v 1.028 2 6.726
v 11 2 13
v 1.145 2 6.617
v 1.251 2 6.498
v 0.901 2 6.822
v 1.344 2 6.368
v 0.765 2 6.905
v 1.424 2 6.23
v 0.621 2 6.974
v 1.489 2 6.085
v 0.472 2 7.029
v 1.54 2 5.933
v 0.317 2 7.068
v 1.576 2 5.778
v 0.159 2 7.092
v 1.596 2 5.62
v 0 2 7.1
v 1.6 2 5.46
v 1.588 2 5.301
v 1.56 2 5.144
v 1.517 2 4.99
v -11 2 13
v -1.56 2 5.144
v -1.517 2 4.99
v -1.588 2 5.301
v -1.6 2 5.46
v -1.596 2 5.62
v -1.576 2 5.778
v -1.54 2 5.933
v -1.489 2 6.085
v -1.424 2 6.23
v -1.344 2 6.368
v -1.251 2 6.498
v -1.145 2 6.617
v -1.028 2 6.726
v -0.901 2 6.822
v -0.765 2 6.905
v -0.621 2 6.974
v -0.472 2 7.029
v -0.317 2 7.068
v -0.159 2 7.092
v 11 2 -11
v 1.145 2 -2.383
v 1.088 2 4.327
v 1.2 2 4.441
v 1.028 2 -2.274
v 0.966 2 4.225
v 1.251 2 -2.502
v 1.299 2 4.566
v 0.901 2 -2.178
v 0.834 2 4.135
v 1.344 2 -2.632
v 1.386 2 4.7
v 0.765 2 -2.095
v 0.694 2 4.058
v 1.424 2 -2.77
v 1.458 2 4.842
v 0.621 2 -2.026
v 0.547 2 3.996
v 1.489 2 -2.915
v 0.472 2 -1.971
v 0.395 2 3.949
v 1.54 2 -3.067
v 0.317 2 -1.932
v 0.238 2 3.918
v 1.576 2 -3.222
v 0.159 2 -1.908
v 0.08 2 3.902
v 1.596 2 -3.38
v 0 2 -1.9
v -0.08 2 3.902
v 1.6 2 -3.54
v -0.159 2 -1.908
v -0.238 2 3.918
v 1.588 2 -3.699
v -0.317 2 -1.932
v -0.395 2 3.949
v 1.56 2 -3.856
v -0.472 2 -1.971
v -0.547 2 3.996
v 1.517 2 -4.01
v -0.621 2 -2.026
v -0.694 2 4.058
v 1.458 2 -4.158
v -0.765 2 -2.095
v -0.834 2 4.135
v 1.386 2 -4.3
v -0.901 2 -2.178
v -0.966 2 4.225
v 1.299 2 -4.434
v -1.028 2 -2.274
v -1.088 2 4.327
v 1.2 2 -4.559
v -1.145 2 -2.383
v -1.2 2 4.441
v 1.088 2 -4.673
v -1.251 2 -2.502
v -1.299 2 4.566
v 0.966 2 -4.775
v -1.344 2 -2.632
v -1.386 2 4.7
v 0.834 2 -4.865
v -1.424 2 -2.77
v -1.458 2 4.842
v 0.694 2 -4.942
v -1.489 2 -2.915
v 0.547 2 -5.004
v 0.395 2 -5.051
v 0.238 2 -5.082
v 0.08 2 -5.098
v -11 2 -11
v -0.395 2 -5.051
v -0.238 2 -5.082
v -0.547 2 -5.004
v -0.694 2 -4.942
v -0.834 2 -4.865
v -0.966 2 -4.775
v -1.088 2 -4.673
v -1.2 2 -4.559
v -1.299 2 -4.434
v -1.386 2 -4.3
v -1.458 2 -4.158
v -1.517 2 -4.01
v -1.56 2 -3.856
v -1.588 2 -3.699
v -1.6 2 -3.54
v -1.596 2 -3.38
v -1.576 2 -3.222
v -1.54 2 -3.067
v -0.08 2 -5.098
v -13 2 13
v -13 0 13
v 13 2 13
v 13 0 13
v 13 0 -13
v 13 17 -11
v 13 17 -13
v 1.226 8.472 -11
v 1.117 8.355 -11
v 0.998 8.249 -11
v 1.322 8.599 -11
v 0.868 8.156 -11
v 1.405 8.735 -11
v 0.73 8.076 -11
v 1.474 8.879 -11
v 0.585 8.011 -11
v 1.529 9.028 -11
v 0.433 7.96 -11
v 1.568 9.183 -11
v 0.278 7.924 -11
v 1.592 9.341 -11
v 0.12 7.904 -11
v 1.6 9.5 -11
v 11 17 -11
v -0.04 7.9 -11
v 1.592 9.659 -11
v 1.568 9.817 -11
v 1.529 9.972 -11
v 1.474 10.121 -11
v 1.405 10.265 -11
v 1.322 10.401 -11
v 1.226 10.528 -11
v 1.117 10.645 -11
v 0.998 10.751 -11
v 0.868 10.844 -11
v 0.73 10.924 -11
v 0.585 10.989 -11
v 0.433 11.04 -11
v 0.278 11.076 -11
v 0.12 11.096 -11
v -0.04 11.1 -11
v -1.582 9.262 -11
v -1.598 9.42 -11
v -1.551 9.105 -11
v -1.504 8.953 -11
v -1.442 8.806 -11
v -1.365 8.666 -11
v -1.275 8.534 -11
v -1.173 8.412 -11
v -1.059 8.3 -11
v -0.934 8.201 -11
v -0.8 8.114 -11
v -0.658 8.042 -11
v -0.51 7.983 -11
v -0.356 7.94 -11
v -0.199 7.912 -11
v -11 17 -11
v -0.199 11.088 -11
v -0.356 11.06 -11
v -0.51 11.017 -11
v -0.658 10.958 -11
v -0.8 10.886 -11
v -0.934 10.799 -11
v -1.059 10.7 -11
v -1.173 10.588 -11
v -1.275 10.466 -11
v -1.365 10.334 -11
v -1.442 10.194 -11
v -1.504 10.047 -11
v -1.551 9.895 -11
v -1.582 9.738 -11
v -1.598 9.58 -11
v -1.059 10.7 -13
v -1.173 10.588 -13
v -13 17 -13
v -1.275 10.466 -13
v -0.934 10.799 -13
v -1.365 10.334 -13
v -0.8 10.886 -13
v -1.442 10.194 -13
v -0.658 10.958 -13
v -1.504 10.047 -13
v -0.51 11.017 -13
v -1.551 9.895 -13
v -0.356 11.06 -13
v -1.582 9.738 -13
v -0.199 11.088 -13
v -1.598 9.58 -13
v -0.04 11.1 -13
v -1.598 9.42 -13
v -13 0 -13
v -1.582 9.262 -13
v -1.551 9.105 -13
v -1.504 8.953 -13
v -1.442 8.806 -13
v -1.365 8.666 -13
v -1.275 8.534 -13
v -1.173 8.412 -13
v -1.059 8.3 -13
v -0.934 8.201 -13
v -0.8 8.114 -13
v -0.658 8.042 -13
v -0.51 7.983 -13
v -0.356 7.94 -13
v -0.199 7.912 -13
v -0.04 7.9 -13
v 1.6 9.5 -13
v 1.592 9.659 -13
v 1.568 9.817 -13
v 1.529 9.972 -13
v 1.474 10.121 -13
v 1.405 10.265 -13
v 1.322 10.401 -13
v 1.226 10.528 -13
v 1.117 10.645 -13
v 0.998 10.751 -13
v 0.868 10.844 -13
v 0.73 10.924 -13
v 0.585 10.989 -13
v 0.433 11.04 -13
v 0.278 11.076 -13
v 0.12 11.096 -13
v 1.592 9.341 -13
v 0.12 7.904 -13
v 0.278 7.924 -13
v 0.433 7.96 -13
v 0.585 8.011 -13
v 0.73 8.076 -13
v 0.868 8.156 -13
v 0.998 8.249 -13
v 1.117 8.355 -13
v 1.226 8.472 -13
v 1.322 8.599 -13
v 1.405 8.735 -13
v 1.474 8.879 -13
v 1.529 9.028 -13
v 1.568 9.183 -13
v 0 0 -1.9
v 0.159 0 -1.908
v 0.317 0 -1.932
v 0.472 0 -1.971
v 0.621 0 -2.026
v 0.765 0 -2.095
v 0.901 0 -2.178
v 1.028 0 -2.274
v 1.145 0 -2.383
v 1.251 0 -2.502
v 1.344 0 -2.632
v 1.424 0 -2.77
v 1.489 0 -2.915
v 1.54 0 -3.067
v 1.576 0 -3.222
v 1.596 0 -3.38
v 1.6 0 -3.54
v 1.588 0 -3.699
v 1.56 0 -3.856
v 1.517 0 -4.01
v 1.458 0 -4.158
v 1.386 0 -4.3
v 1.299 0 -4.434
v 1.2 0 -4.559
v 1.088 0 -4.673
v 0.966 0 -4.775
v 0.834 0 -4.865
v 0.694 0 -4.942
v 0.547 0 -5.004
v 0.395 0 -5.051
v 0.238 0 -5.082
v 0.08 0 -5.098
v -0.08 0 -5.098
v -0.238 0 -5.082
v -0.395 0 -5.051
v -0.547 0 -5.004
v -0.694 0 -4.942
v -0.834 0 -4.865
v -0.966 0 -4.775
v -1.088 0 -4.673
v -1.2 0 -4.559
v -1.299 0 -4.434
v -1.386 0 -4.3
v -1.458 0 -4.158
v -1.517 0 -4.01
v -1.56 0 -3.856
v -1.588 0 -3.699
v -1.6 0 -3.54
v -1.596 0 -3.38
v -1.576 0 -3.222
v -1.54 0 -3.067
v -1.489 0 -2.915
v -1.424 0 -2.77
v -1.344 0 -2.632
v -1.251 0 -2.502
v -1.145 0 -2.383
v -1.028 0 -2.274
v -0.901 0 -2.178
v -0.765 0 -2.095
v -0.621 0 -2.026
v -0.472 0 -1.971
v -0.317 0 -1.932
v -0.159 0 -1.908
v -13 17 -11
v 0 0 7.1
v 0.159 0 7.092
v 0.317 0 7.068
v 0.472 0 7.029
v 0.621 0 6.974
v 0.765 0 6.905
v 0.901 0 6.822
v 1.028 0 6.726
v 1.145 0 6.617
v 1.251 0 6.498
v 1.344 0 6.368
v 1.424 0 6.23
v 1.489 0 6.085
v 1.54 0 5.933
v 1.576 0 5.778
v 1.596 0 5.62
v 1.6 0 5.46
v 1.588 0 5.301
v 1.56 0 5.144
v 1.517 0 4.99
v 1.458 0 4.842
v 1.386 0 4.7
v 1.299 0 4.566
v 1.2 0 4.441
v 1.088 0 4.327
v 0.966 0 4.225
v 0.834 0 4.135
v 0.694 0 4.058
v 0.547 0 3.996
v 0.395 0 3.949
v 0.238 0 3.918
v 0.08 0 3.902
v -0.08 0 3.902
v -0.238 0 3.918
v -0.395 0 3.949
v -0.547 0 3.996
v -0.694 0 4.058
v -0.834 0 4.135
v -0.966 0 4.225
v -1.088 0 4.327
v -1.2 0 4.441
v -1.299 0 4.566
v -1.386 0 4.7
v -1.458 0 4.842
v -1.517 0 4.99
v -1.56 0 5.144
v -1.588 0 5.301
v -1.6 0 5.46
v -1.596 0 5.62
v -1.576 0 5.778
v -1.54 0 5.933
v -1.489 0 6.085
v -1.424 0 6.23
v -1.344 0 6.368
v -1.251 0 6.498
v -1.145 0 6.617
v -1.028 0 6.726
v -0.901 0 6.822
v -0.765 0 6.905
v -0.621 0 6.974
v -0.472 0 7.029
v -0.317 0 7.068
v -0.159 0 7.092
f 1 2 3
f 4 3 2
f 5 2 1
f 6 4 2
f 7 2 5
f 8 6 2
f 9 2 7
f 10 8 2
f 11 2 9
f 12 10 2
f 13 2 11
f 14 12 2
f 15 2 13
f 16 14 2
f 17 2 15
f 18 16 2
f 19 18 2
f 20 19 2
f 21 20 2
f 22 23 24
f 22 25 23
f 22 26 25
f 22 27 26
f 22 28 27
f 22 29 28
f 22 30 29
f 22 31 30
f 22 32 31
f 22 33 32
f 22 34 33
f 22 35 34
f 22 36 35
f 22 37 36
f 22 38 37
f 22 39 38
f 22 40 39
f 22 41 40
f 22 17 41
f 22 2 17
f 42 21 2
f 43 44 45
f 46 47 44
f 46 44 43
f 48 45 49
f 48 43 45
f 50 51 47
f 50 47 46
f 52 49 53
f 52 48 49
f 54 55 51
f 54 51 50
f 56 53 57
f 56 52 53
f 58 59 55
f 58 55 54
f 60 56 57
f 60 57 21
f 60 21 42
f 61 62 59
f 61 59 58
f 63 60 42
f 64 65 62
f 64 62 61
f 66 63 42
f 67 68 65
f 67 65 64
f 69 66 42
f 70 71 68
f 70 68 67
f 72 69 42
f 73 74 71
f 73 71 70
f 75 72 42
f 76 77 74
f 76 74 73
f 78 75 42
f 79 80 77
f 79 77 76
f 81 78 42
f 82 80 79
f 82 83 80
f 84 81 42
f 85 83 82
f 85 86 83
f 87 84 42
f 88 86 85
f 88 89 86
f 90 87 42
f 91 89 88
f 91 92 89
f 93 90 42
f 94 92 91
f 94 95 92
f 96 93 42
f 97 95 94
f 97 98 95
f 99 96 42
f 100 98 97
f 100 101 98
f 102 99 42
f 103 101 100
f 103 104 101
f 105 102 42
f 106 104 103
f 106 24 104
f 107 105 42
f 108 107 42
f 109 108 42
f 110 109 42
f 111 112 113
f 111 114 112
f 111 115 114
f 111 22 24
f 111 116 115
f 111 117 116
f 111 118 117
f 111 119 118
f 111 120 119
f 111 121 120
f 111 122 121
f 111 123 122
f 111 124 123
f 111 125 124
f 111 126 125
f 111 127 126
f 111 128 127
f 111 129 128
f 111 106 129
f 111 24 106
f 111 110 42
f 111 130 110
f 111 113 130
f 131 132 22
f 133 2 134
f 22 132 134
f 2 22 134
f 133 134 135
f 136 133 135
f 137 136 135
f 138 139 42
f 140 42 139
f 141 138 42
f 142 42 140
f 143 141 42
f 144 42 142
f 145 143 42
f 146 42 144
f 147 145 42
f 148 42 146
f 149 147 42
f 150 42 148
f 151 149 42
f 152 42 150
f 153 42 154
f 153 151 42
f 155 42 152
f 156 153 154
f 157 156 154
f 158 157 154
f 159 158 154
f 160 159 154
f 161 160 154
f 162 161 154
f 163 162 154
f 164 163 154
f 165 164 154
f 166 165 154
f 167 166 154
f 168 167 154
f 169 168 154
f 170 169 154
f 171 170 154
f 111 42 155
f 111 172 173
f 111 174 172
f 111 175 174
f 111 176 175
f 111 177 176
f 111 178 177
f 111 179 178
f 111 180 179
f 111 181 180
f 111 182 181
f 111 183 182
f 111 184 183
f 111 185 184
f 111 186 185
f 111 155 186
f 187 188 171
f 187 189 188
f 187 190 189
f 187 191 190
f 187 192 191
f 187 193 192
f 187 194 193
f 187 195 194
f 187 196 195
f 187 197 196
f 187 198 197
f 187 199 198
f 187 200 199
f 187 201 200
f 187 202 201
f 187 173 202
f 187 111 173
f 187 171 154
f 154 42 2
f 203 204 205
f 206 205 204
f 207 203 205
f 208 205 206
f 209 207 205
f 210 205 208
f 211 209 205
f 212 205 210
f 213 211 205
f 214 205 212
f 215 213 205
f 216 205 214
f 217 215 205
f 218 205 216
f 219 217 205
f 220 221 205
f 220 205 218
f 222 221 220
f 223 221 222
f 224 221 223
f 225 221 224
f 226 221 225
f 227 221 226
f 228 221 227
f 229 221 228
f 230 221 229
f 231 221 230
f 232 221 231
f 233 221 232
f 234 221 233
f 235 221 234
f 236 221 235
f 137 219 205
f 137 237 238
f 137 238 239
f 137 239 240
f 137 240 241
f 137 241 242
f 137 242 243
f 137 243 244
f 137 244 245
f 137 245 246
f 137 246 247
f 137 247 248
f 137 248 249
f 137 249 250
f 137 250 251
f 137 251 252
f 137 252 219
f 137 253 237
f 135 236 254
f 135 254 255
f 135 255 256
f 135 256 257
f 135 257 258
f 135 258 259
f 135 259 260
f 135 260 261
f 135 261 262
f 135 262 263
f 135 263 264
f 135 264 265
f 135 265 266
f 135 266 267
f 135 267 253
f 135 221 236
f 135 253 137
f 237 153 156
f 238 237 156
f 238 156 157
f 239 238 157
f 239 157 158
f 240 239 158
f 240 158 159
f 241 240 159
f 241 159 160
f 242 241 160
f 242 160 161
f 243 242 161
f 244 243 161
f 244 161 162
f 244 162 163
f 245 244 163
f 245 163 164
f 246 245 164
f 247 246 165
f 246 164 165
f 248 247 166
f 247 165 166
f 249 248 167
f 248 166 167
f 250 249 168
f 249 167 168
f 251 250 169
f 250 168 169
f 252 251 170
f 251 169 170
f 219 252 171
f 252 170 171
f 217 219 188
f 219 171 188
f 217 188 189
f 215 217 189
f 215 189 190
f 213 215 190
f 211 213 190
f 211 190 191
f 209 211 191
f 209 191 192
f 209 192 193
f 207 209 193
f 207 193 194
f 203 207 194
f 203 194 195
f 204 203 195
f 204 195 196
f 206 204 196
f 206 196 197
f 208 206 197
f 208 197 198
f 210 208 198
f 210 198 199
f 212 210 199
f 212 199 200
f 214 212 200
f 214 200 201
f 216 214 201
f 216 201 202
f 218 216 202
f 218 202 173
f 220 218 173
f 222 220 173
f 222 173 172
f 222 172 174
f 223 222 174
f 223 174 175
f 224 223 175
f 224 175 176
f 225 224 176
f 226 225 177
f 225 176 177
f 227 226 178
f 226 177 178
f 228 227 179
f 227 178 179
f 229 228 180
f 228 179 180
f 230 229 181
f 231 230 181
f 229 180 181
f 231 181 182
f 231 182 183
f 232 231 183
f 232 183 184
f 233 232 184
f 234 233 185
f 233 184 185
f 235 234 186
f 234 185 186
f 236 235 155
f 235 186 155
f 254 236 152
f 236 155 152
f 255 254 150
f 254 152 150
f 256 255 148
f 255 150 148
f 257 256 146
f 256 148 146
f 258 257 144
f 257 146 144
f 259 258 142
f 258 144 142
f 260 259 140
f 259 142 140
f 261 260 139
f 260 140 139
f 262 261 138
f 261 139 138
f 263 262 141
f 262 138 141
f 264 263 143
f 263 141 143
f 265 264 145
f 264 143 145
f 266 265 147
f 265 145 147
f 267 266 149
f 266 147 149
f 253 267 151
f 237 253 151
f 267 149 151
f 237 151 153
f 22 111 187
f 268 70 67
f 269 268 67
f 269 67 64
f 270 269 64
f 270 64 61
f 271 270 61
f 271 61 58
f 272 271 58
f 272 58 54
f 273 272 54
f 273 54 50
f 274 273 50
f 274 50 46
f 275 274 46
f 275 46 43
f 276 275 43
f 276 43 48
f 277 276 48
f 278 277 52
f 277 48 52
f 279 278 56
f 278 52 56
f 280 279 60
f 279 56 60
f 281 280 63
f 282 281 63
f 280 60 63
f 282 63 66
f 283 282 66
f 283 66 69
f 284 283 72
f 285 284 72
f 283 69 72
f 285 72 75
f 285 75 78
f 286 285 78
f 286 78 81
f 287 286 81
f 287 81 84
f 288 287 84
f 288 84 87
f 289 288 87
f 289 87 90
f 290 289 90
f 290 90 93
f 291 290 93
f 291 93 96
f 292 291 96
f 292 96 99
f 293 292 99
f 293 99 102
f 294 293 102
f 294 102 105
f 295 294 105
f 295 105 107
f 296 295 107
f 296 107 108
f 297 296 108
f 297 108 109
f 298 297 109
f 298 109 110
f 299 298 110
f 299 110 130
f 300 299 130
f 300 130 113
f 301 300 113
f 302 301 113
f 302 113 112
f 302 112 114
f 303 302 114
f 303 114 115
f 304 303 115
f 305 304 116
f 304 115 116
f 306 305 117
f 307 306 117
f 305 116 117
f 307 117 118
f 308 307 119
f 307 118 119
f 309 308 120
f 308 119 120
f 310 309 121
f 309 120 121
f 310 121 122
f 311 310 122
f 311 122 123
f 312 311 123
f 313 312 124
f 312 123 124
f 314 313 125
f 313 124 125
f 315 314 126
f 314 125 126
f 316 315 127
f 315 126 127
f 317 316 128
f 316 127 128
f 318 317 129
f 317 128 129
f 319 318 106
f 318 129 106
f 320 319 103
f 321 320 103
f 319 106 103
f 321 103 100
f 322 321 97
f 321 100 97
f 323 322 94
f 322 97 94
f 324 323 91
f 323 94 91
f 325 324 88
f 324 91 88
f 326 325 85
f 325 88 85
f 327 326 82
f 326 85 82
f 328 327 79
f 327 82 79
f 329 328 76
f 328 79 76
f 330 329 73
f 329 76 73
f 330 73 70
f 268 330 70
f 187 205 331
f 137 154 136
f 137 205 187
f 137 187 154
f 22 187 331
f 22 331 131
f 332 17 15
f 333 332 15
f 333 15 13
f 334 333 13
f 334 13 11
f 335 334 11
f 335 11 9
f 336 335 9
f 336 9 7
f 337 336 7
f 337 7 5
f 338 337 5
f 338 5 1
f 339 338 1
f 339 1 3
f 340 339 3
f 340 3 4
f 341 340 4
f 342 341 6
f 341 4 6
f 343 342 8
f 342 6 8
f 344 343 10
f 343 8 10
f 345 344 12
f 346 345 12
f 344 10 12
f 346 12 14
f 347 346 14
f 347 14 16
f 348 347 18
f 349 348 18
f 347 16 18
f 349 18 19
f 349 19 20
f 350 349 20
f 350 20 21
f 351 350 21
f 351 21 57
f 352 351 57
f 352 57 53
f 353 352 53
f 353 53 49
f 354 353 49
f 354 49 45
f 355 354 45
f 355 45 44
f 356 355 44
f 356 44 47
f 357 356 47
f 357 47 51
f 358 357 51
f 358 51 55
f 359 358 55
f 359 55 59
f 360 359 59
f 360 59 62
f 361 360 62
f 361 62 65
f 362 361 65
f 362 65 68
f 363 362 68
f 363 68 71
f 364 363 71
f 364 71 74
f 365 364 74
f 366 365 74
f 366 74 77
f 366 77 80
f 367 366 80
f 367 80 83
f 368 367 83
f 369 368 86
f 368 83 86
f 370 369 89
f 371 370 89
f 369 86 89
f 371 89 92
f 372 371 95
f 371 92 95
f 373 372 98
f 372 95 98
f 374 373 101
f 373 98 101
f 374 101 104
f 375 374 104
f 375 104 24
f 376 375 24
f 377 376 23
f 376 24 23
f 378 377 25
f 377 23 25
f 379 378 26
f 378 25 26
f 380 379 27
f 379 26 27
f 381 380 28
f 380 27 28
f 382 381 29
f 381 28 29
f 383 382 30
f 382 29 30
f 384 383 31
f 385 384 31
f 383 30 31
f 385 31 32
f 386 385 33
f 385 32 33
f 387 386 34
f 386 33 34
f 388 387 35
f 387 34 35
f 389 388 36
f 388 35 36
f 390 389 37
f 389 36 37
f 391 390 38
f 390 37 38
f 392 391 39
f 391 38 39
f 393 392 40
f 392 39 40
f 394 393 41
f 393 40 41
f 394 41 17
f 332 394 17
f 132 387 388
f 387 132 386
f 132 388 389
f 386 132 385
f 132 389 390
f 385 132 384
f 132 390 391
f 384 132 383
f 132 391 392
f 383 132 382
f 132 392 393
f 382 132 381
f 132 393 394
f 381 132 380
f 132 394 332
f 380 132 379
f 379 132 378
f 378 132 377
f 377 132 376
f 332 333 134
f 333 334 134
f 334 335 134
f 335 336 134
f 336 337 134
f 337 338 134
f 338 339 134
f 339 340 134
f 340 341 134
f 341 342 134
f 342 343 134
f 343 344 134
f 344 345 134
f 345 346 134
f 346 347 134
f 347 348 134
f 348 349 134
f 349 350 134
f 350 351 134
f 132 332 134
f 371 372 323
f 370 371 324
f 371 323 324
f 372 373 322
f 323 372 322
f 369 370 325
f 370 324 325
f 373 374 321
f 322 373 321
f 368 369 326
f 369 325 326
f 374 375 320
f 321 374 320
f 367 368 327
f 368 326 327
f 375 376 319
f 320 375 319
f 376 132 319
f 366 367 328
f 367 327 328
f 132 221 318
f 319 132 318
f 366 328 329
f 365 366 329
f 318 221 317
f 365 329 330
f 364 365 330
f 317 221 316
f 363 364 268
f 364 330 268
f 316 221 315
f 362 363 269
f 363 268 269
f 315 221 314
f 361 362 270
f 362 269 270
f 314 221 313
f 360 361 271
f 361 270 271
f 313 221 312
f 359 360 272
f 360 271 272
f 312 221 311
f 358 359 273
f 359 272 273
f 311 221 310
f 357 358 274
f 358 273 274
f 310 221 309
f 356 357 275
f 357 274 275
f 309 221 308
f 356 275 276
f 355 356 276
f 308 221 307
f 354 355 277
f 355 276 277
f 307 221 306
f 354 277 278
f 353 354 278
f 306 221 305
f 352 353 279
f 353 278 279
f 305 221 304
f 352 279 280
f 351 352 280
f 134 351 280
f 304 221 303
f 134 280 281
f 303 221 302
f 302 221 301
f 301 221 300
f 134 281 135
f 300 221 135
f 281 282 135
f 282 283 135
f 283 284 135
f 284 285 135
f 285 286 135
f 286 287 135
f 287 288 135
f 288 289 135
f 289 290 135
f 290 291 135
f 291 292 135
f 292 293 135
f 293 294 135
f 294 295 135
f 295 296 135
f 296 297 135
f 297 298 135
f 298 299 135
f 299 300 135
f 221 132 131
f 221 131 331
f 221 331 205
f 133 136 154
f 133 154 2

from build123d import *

# Parameters (mm, degrees)
SKETCH_1_W          = 26
SKETCH_1_H          = 26
EXTRUDE_1_DEPTH     = 17
CUT_EXTRUDE_1_DEPTH = 34.674916481
SHELL_START         = -11
SHELL_2_DEPTH       = 22
SKETCH_3_R          = 1.6
CUT_EXTRUDE_2_DEPTH = 24.727621035
SKETCH_4_R          = 1.6
CUT_EXTRUDE_3_DEPTH = 33.155870382


# Read off the part's stored shape, not the designer's step: ｼｪﾙ2
with BuildPart() as part:
    # ｽｹｯﾁ1 → ﾎﾞｽ - 押し出し1 (new body)
    with BuildSketch(Plane(origin=(0, 0, 0), x_dir=(1, 0, 0), z_dir=(0, 1, 0))):
        Rectangle(SKETCH_1_W, SKETCH_1_H)
    extrude(amount=EXTRUDE_1_DEPTH)

    # ｽｹｯﾁ2 → ｶｯﾄ - 押し出し1 (cut, through all)
    with BuildSketch(Plane(origin=(13, 0, 0), x_dir=(0, 0, -1), z_dir=(1, 0, 0))):
        Polygon((11, 17), (-13, 2), (-13, 17), align=None)
    extrude(amount=-CUT_EXTRUDE_1_DEPTH, mode=Mode.SUBTRACT)

    # ｼｪﾙ2 outline → ｼｪﾙ2 (cut)
    with BuildSketch(Plane.YZ.offset(SHELL_START)):
        Polygon((2, -11), (17, -11), (2, 13), align=None)
    extrude(amount=SHELL_2_DEPTH, mode=Mode.SUBTRACT)

    # ｽｹｯﾁ3 → ｶｯﾄ - 押し出し2 (cut, through all)
    with BuildSketch(Plane(origin=(0, 2, 0), x_dir=(1, 0, 0), z_dir=(0, 1, 0))):
        with Locations(Location((0, 3.5, 0), (0, 0, 270))):
            Circle(SKETCH_3_R)
        with Locations(Location((0, -5.5, 0), (0, 0, 270))):
            Circle(SKETCH_3_R)
    extrude(amount=-CUT_EXTRUDE_2_DEPTH, mode=Mode.SUBTRACT)

    # ｽｹｯﾁ4 → ｶｯﾄ - 押し出し3 (cut, through all)
    with BuildSketch(Plane.XY.offset(-11)):
        with Locations((0, 9.5)):
            Circle(SKETCH_4_R)
    extrude(amount=-CUT_EXTRUDE_3_DEPTH, mode=Mode.SUBTRACT)


solid = part.part
